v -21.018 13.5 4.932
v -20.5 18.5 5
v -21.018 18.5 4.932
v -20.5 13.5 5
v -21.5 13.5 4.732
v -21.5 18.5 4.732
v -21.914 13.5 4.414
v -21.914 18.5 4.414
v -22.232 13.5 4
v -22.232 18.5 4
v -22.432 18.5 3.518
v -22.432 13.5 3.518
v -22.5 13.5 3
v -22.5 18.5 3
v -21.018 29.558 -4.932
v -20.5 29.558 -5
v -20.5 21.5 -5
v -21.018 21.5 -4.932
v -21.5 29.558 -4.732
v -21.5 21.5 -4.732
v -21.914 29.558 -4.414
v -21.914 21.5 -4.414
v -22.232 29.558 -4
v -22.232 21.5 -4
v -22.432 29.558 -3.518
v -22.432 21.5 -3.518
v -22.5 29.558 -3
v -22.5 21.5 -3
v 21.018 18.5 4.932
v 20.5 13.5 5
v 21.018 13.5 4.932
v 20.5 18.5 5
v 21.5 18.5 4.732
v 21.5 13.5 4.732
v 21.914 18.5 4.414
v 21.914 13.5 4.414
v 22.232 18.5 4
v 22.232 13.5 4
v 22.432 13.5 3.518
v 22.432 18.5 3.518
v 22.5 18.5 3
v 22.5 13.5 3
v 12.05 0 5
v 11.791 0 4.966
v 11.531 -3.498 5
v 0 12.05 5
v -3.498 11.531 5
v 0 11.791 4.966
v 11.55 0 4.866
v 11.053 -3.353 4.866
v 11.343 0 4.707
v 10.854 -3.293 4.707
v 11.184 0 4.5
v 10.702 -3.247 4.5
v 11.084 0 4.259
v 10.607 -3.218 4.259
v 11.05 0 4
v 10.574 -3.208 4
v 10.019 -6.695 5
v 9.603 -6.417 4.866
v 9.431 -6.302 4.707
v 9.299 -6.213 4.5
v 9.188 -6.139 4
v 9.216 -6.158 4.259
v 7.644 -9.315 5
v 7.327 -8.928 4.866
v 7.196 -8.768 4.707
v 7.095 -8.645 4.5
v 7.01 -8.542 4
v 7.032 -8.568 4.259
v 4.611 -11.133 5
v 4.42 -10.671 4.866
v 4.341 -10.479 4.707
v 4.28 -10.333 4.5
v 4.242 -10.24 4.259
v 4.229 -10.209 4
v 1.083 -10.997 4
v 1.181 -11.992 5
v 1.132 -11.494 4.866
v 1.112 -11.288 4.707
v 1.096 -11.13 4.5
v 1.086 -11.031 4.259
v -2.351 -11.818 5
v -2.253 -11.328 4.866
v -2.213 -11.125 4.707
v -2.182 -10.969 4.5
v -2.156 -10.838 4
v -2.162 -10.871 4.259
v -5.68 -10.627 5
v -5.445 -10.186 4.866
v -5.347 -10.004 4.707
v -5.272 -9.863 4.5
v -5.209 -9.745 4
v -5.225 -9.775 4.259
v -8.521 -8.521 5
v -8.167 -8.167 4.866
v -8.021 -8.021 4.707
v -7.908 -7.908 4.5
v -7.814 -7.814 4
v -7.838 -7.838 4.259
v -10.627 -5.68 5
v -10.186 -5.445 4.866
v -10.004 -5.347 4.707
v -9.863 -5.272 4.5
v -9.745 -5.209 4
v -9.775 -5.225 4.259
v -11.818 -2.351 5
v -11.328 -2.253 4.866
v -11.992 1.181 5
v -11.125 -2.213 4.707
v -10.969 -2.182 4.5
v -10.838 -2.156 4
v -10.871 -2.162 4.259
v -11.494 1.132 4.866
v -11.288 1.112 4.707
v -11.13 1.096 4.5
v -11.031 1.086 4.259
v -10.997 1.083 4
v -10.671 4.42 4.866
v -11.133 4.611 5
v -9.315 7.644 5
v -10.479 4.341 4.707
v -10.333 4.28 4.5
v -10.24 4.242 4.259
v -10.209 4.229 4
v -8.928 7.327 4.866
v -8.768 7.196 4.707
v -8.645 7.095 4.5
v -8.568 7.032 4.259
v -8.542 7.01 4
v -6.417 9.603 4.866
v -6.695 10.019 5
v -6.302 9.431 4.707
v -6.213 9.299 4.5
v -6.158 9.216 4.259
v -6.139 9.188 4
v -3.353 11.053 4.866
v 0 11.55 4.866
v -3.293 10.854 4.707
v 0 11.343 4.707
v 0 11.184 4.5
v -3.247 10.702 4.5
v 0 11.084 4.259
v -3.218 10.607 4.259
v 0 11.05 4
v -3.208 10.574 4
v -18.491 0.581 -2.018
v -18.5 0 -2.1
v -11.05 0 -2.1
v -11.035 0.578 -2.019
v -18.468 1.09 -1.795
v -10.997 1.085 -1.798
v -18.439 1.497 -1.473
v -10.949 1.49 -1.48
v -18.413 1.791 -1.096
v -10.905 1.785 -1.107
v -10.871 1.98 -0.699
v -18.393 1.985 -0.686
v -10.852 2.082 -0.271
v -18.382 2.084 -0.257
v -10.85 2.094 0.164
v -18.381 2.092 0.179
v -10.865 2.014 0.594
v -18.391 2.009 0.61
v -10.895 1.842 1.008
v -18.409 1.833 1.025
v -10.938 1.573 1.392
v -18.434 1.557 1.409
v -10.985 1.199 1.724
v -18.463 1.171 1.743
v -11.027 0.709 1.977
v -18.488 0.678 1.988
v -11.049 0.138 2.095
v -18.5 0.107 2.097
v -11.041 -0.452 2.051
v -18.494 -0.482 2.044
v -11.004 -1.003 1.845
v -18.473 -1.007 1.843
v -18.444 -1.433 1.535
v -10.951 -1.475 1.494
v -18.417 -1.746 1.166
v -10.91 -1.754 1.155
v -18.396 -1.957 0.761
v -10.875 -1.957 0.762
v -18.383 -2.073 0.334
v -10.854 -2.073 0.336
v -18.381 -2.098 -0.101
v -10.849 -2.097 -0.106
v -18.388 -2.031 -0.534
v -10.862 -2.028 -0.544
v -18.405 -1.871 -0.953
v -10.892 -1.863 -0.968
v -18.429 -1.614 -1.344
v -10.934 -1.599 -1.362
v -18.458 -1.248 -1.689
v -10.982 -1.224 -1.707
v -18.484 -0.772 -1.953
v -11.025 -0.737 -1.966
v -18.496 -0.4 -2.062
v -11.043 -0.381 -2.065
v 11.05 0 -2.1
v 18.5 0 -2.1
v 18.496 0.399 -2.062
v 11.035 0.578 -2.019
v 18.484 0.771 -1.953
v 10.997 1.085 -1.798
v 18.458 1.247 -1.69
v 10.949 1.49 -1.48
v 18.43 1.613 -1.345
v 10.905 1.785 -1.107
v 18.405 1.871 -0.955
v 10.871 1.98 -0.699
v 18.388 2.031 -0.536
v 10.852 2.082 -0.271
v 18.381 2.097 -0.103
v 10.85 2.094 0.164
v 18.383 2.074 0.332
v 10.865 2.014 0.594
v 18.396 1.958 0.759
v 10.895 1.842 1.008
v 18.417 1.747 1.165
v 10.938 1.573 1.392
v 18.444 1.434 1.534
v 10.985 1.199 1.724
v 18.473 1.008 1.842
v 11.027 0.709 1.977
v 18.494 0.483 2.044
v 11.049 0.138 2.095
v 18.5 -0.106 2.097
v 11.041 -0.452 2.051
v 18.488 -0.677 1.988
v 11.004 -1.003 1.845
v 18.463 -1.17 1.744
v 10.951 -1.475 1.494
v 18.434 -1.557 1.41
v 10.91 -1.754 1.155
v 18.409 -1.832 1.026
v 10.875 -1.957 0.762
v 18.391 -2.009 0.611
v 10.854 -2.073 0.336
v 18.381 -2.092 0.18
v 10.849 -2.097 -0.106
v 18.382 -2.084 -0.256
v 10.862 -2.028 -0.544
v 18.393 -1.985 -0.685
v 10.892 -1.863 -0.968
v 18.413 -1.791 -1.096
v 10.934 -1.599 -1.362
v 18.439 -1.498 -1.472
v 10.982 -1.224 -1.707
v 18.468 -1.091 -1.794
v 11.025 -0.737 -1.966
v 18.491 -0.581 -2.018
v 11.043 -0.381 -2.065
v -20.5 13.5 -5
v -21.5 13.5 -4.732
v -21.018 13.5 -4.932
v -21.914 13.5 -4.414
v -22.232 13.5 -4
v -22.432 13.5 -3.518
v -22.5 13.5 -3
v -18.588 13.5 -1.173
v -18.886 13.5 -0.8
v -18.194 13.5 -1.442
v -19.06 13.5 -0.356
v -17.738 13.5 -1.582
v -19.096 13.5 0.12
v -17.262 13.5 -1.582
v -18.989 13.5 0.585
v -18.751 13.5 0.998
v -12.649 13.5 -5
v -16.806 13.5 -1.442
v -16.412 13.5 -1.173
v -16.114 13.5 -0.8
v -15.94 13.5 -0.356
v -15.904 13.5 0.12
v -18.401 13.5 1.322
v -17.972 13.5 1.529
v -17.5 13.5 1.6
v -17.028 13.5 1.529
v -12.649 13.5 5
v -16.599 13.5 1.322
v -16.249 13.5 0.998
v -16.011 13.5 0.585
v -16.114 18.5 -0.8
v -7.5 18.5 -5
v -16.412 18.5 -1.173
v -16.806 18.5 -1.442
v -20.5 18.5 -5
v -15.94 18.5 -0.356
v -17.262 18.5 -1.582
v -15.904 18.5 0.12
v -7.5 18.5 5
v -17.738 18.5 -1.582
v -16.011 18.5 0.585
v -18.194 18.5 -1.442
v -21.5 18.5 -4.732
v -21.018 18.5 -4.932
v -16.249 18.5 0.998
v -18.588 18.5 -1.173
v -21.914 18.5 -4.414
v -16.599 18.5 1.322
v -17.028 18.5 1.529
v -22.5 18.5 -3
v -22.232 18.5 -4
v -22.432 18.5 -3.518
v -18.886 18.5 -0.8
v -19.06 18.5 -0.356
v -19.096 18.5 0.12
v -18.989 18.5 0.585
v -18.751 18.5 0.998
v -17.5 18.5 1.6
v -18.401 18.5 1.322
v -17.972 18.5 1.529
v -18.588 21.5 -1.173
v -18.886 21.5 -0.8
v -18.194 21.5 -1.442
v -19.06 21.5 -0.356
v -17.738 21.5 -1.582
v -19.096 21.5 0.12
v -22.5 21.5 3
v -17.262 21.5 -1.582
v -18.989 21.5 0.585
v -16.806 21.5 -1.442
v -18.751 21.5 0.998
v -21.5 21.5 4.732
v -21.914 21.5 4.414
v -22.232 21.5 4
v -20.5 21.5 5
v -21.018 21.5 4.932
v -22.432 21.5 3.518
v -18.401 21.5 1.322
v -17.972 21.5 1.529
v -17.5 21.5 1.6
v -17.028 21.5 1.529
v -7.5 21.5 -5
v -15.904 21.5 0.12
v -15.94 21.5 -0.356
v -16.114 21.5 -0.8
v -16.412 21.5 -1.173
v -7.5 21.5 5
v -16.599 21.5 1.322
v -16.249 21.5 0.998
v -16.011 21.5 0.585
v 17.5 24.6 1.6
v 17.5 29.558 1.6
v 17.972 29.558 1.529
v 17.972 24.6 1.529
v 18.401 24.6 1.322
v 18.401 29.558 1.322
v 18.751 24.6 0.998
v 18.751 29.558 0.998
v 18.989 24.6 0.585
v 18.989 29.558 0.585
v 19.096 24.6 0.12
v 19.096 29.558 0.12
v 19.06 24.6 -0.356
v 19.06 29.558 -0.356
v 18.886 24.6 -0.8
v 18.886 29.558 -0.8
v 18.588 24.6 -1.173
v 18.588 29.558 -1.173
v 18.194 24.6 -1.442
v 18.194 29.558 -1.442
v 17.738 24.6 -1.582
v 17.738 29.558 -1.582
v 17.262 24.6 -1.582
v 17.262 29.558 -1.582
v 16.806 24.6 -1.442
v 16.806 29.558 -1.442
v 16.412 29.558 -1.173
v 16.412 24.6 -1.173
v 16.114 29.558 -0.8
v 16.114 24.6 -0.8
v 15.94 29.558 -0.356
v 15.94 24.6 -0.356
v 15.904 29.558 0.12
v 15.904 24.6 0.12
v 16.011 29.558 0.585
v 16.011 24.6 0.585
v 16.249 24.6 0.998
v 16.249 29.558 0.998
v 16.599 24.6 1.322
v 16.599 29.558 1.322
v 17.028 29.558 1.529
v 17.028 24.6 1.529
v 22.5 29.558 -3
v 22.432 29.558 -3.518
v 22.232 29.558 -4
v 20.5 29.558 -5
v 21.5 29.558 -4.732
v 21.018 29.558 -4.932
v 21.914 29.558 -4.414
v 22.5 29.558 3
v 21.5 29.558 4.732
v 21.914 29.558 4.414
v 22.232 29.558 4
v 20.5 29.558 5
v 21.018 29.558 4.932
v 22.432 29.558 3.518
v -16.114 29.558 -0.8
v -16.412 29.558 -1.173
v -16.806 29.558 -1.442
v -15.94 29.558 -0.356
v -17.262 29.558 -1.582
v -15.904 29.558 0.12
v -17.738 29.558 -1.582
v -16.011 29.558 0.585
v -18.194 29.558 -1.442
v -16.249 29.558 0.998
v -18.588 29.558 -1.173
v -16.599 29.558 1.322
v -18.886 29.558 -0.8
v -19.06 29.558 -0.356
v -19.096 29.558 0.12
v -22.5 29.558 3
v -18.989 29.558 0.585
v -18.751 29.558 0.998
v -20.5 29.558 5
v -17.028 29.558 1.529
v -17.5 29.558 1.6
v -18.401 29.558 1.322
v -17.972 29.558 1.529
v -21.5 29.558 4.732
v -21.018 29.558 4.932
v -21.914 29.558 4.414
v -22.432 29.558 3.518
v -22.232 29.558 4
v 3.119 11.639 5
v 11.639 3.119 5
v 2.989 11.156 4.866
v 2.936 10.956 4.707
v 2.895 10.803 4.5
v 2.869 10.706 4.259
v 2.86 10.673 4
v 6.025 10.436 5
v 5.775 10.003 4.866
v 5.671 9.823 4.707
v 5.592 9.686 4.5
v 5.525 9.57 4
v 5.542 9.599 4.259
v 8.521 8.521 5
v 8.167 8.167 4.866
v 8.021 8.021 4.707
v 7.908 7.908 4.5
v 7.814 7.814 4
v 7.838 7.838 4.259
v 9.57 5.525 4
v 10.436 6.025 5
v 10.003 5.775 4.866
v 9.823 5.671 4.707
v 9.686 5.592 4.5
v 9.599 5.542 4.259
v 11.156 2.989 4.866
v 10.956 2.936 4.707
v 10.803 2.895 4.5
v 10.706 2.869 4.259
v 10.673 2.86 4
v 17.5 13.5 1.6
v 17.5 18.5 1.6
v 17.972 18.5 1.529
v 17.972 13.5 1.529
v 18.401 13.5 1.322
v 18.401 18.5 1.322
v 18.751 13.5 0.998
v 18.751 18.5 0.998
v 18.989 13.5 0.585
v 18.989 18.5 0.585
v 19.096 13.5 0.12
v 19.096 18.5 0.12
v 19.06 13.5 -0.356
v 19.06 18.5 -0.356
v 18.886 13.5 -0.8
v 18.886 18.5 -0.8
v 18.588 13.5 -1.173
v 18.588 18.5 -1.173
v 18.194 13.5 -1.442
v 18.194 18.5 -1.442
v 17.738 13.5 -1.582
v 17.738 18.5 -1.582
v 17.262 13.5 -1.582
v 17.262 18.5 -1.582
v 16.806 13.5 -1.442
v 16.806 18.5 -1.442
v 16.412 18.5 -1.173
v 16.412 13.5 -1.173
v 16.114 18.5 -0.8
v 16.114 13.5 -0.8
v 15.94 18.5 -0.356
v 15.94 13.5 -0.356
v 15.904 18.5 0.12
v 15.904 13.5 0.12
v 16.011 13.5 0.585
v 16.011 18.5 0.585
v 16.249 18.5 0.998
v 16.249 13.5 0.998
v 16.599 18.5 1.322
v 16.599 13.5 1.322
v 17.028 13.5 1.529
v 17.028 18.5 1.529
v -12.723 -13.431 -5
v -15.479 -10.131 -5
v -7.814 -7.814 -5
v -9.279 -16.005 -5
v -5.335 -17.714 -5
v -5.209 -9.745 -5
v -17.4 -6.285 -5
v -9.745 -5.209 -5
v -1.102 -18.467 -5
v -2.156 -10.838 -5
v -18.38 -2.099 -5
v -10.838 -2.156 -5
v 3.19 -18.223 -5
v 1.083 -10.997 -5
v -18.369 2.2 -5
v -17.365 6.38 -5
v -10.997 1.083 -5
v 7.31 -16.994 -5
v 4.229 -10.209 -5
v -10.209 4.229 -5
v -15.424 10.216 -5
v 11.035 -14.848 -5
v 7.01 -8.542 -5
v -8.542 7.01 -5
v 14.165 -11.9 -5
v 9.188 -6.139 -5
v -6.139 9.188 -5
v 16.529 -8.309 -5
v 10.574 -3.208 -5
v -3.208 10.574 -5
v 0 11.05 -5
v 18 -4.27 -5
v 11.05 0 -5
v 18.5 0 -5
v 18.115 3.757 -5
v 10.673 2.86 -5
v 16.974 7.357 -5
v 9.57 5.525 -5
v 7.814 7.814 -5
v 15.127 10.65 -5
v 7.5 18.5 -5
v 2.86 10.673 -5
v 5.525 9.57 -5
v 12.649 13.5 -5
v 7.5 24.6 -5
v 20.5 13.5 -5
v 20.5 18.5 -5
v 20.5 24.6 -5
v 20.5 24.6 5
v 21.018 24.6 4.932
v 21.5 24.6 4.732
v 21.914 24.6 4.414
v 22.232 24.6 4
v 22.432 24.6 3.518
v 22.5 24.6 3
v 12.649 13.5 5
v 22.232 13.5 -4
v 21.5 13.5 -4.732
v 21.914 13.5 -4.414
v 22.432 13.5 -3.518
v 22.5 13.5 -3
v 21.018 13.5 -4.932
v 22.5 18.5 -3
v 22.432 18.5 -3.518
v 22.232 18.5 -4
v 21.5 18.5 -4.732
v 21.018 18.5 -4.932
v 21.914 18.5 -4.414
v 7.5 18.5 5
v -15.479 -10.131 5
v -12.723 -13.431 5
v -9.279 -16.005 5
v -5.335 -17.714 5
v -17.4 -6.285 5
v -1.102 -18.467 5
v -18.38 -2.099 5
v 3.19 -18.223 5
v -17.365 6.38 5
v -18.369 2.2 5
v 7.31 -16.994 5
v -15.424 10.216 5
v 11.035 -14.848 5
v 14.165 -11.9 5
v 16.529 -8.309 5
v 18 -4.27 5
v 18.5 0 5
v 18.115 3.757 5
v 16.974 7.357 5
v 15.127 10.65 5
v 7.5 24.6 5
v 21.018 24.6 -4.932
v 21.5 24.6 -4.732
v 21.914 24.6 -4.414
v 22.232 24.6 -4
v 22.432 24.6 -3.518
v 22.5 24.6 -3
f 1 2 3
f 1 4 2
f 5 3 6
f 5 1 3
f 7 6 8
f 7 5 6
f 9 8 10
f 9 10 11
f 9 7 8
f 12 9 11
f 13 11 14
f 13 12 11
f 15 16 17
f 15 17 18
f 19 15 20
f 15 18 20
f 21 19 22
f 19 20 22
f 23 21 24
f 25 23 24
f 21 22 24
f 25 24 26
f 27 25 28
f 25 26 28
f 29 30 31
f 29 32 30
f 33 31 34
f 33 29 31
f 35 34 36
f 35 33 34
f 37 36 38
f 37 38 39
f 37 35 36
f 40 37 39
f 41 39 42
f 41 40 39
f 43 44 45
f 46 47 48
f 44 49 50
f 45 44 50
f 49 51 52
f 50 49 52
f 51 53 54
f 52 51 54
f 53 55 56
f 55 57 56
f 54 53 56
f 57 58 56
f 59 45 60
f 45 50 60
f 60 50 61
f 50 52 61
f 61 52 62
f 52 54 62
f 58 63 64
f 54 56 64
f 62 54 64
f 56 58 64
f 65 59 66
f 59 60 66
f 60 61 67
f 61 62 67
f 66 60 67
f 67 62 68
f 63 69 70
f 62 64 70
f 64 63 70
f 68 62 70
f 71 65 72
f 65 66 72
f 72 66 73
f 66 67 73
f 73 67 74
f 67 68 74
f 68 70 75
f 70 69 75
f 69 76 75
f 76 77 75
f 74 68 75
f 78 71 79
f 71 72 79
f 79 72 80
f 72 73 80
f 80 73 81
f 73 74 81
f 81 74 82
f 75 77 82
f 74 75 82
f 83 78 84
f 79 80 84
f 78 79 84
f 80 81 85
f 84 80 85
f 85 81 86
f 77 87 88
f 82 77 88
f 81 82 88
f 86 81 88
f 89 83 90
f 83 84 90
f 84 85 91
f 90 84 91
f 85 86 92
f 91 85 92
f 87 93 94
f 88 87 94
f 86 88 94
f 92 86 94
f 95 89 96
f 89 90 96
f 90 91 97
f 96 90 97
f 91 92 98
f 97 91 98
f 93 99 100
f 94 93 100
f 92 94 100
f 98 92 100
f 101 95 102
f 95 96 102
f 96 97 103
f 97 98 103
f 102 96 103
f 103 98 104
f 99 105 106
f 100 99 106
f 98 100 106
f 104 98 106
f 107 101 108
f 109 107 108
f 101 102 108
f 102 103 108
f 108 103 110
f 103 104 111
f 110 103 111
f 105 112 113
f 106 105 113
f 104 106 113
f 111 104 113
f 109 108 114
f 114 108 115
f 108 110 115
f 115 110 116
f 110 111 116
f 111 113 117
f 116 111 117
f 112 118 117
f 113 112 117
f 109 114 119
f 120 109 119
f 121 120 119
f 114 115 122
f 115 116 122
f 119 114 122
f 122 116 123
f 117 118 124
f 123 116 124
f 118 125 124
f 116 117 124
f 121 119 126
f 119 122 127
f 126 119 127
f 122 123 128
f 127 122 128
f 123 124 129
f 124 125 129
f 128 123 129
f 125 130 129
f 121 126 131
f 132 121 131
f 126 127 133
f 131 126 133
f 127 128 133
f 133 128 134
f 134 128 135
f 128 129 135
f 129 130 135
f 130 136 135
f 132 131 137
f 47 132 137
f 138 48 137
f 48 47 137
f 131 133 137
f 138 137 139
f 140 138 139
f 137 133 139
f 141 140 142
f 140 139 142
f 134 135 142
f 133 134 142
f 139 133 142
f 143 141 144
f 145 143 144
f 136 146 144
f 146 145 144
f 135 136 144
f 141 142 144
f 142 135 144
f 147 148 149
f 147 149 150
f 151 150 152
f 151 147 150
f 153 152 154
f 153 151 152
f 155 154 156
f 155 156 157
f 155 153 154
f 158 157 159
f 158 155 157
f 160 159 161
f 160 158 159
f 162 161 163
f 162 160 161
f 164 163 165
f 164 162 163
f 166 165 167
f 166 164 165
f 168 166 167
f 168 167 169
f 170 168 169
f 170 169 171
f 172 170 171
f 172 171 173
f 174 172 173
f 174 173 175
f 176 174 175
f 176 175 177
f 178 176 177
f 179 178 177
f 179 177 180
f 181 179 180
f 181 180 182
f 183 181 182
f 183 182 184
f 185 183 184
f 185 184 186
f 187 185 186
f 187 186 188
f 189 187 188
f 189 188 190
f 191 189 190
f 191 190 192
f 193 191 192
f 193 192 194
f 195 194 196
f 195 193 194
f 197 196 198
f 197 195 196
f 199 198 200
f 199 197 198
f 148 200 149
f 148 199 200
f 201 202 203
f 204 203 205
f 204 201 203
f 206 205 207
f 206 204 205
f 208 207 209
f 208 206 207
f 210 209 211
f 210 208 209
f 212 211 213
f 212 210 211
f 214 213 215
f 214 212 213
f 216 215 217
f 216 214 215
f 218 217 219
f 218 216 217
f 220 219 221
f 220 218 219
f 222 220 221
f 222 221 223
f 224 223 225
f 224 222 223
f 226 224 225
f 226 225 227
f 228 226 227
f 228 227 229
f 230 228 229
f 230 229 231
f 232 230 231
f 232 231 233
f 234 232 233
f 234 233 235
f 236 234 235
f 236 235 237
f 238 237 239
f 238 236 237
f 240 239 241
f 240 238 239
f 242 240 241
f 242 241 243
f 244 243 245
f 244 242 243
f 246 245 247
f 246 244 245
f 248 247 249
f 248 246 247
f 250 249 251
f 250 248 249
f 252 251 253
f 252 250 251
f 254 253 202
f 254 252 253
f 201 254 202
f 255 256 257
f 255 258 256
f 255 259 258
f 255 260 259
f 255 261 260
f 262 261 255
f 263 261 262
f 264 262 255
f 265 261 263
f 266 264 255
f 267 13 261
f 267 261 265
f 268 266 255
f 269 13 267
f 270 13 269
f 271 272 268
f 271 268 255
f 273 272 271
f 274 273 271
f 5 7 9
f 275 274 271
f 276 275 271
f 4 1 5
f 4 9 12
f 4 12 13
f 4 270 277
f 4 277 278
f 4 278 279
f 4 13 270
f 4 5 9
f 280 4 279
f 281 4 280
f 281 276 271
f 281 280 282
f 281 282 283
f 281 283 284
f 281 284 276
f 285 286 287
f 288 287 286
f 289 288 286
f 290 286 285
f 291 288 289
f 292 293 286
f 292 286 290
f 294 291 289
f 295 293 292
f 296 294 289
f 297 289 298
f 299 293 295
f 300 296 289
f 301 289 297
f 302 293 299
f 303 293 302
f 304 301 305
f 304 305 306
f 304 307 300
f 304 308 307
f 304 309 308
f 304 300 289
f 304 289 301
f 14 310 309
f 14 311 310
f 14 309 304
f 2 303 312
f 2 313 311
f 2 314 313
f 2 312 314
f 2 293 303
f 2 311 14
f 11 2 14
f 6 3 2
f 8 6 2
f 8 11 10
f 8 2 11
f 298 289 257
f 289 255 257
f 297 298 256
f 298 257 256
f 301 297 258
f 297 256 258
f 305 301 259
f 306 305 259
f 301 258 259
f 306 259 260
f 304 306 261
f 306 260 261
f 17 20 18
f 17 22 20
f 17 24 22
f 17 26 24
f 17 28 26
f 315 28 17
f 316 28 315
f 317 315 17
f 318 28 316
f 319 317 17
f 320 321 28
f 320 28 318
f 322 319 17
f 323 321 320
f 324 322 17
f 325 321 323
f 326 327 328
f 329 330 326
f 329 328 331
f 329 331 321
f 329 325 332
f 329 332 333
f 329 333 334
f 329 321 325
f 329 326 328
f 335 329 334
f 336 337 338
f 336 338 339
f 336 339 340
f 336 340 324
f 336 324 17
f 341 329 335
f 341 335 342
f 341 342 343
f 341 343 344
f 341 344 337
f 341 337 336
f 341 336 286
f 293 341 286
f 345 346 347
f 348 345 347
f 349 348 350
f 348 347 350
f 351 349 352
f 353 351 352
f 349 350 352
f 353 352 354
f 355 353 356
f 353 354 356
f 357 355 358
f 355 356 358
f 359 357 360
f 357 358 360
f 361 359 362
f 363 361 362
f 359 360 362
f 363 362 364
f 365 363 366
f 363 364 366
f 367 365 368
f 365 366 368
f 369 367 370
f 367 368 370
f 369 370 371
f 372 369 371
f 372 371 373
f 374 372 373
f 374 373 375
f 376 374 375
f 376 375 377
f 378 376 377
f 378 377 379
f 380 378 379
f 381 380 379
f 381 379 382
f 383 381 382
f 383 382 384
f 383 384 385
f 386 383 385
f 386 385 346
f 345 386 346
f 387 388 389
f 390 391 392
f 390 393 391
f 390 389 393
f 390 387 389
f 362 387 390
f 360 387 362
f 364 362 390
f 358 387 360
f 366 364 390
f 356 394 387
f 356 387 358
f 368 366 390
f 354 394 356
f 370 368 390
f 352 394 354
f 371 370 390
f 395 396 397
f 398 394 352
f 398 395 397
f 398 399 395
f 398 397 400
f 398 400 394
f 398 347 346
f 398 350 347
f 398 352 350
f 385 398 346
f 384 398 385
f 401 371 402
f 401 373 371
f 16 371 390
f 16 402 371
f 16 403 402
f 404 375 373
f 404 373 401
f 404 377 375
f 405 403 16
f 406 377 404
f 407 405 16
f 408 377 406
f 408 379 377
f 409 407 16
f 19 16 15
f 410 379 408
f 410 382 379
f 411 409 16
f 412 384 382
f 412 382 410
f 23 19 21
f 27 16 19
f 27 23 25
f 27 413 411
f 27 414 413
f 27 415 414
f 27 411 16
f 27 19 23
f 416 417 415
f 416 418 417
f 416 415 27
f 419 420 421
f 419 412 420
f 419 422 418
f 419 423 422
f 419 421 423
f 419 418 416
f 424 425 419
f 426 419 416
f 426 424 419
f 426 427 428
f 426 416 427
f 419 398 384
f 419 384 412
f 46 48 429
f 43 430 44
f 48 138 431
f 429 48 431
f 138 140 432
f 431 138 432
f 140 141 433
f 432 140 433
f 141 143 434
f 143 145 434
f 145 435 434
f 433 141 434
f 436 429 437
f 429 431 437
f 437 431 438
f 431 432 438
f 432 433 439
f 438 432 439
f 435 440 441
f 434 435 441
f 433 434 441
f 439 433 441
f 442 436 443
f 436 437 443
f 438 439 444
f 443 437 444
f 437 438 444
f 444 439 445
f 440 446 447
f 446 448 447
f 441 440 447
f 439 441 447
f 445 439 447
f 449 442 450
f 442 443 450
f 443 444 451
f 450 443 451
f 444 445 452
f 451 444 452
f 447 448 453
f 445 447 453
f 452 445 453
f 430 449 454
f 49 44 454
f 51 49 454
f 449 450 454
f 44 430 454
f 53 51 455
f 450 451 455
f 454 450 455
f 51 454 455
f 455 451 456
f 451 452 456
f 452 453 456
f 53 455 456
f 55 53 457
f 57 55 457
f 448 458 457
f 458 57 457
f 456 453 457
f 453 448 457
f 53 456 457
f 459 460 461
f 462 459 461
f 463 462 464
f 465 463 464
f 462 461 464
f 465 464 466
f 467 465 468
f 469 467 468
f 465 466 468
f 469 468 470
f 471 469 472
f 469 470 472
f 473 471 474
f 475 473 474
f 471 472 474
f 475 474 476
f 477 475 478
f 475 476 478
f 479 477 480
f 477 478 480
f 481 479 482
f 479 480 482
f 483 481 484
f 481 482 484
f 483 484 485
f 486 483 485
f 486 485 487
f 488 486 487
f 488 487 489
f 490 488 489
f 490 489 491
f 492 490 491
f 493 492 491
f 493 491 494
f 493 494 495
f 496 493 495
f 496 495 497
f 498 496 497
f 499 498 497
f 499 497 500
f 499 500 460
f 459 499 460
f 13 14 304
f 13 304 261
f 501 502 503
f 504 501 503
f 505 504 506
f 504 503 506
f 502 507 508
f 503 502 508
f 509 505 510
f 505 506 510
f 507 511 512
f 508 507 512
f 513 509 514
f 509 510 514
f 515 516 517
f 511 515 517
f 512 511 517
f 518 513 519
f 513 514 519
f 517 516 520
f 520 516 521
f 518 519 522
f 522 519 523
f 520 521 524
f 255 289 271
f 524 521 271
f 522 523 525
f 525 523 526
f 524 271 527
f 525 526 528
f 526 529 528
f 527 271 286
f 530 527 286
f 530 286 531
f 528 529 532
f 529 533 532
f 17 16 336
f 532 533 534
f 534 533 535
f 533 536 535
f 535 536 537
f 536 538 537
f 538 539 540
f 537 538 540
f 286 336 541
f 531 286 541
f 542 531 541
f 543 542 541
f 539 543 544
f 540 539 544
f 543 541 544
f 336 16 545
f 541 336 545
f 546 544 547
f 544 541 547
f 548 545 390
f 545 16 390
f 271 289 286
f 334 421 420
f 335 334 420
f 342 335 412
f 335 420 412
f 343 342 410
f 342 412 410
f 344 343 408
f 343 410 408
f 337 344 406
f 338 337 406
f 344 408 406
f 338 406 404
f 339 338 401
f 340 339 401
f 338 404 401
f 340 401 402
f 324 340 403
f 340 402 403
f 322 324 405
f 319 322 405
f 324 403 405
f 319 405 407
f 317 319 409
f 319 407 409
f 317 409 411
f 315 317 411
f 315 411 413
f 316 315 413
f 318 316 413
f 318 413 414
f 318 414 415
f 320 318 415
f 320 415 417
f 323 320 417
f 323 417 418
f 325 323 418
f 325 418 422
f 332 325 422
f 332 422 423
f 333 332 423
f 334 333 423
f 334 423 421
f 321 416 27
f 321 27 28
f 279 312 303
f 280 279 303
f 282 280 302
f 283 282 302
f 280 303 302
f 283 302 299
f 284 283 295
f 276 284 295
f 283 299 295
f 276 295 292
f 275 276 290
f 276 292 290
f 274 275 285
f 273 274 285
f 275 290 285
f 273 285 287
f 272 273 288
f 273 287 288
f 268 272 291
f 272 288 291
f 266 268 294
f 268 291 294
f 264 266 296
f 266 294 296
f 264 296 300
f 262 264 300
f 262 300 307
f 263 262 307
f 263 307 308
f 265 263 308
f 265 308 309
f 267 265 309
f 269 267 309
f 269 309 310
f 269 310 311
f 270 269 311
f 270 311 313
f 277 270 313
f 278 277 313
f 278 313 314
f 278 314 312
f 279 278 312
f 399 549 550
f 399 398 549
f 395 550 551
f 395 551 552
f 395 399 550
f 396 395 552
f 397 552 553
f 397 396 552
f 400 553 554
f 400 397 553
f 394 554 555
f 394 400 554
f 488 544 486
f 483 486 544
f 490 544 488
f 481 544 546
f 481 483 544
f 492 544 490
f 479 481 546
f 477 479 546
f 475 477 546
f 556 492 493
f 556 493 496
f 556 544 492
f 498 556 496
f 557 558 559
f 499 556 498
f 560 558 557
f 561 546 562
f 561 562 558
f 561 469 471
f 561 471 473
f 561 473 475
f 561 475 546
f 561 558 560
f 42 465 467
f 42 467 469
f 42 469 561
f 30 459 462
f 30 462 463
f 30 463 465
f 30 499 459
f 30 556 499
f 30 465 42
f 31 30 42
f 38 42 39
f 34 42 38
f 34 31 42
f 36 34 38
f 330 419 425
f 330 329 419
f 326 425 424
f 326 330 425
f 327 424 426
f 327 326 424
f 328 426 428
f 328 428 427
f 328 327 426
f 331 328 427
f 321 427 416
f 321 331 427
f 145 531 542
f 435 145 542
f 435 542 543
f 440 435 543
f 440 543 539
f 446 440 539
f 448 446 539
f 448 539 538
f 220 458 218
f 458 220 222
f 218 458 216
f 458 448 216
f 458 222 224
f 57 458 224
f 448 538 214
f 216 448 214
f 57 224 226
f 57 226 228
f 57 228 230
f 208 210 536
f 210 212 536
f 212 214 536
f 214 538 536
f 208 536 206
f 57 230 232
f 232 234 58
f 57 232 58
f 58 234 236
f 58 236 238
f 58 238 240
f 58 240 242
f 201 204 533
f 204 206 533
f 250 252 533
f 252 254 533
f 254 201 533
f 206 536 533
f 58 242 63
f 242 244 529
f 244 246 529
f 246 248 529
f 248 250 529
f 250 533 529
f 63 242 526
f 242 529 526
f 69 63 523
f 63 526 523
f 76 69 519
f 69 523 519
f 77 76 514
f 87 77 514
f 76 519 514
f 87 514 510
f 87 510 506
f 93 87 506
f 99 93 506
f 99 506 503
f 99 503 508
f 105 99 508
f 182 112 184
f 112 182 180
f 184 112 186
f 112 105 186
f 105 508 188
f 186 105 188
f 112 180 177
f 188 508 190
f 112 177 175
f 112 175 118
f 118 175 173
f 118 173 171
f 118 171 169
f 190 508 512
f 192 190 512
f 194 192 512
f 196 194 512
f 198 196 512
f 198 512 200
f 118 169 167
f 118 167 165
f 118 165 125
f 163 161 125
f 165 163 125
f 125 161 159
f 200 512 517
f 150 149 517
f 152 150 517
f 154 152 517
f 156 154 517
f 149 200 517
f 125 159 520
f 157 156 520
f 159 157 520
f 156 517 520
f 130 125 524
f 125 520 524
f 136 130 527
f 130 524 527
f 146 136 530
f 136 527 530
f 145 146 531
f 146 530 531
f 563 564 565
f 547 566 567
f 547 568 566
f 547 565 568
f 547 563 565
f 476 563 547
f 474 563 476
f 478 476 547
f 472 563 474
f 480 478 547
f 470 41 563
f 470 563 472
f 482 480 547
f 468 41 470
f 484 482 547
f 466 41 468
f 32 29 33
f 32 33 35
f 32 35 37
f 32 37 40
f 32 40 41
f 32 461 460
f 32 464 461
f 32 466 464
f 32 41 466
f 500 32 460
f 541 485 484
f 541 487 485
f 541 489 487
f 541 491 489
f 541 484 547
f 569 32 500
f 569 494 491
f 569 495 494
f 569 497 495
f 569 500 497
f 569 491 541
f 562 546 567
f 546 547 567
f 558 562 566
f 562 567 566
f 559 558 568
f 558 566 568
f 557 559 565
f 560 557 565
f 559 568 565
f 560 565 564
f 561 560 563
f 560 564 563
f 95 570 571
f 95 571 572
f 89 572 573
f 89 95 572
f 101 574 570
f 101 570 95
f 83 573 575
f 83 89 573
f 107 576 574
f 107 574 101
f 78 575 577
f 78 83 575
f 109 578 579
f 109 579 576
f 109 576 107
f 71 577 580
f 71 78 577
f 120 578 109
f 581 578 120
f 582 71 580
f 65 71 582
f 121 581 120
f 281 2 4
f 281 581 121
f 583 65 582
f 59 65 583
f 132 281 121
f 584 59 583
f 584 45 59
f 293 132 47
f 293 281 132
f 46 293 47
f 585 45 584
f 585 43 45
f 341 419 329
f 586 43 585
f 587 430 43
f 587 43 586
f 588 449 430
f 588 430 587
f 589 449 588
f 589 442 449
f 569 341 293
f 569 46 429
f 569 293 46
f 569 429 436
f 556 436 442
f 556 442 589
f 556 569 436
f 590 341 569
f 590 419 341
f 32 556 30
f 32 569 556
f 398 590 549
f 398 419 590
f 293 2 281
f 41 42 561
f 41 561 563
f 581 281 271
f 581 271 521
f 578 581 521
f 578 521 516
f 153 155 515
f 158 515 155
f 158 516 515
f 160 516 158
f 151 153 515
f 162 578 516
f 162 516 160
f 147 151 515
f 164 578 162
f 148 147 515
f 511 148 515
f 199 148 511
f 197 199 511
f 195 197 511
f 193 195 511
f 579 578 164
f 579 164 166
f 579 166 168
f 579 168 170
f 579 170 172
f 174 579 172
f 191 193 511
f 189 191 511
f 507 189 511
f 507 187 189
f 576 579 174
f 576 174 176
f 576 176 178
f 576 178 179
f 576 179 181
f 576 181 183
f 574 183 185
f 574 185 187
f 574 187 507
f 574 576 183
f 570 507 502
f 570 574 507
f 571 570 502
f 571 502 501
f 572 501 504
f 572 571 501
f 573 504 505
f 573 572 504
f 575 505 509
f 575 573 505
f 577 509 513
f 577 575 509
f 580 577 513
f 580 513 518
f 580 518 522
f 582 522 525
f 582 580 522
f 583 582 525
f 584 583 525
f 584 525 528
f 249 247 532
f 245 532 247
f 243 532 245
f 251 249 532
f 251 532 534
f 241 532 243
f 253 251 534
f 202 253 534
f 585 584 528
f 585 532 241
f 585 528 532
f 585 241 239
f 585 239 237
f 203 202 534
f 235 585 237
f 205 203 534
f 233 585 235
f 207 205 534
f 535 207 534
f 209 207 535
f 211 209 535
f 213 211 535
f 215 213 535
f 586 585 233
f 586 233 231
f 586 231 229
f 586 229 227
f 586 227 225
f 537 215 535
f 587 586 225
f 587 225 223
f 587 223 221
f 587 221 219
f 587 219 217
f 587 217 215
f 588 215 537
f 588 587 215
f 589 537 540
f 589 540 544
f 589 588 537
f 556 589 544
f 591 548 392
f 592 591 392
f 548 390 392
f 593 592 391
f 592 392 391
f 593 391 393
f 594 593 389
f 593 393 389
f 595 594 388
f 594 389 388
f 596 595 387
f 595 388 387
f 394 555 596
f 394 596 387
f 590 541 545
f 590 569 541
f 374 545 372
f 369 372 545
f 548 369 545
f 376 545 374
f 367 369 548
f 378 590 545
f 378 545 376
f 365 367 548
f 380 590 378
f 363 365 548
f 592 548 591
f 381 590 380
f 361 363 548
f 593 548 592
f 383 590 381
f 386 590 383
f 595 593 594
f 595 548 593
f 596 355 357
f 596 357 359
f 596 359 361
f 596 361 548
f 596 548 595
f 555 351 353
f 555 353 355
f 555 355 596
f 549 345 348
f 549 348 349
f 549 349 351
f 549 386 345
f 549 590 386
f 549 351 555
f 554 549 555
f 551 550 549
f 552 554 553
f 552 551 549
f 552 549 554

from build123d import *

# Parameters (mm, degrees)
CROQUIS1_W                 = 7.5
CROQUIS1_H                 = 6.1
SALIENTE_EXTRUIR2_DEPTH    = 5
CROQUIS2_R                 = 1.6
CORTAR_EXTRUIR1_DEPTH      = 18
REDONDEO1_R                = 1
CORTAR_EXTRUIR2_DEPTH      = 38.482562804
CORTAR_EXTRUIR2_DEPTH_BACK = 38.482562804
CROQUIS3_R                 = 2.1
REDONDEO2_R                = 2


with BuildPart() as part:
    # Croquis1 → Saliente-Extruir2 (new, symmetric)
    # profile 1 of 8: a face of its own
    with BuildSketch(Plane.XY):
        with BuildLine():
            ThreePointArc((12.649110641, 13.5), (6.800735254, 17.204650534), (-1e-09, 18.5))
            ThreePointArc((-1e-09, 18.5), (-6.800735255, 17.204650534), (-12.649110641, 13.5))
            ThreePointArc((-12.649110641, 13.5), (-7.356679045, -16.974371076), (18.5, 0))
            ThreePointArc((18.5, 0), (16.974371076, 7.356679045), (12.649110641, 13.5))
        make_face()
        with BuildLine():
            ThreePointArc((11.05, 0), (-7.813529932, -7.813529932), (0, 11.05))
            ThreePointArc((0, 11.05), (7.813529932, 7.813529932), (11.05, 0))
        make_face(mode=Mode.SUBTRACT)
    # profile 2 of 8: a face of its own
    with BuildSketch(Plane.XY):
        with BuildLine():
            ThreePointArc((12.649110641, 13.5), (6.800735254, 17.204650534), (-1e-09, 18.5))
            ThreePointArc((-1e-09, 18.5), (-6.800735255, 17.204650534), (-12.649110641, 13.5))
            ThreePointArc((-12.649110641, 13.5), (-7.356679045, -16.974371076), (18.5, 0))
            ThreePointArc((18.5, 0), (16.974371076, 7.356679045), (12.649110641, 13.5))
        make_face()
        with BuildLine():
            ThreePointArc((11.05, 0), (-7.813529932, -7.813529932), (0, 11.05))
            ThreePointArc((0, 11.05), (7.813529932, 7.813529932), (11.05, 0))
        make_face(mode=Mode.SUBTRACT)
    # profile 3 of 8: a face of its own
    with BuildSketch(Plane.XY):
        with BuildLine():
            Line((7.5, 18.5), (-1e-09, 18.5))
            ThreePointArc((-1e-09, 18.5), (6.800735254, 17.204650534), (12.649110641, 13.5))
            Line((12.649110641, 13.5), (22.5, 13.5))
            Line((22.5, 13.5), (22.5, 18.5))
            Line((22.5, 18.5), (7.5, 18.5))
        make_face()
    # profile 4 of 8: a face of its own
    with BuildSketch(Plane.XY):
        with BuildLine():
            Line((-7.5, 18.5), (-22.5, 18.5))
            Line((-22.5, 18.5), (-22.5, 13.5))
            Line((-22.5, 13.5), (-12.649110641, 13.5))
            ThreePointArc((-12.649110641, 13.5), (-6.800735255, 17.204650534), (-1e-09, 18.5))
            Line((-1e-09, 18.5), (-7.5, 18.5))
        make_face()
    # profile 5 of 8: a face of its own
    with BuildSketch(Plane.XY):
        Polygon((-22.5, 21.5), (-7.5, 21.5), (-7.5, 24.6), (0, 24.6), (0, 29.558290112), (-22.5, 29.558290112), (-22.5, 24.558290112), align=None)
    # profile 6 of 8: a face of its own
    with BuildSketch(Plane.XY):
        with Locations((3.75, 21.55)):
            Rectangle(CROQUIS1_W, CROQUIS1_H)
    # profile 7 of 8: a face of its own
    with BuildSketch(Plane.XY):
        Polygon((-7.5, 21.5), (-7.5, 18.5), (-1e-09, 18.5), (0, 24.6), (-7.5, 24.6), align=None)
    # profile 8 of 8: a face of its own
    with BuildSketch(Plane.XY):
        Polygon((0, 29.558290112), (0, 24.6), (7.5, 24.6), (22.5, 24.6), (22.5, 29.558290112), align=None)
    extrude(amount=SALIENTE_EXTRUIR2_DEPTH, both=True)

    # Croquis2 → Cortar-Extruir1 (cut)
    with BuildSketch(Plane(origin=(0, 29.558290112, 0), x_dir=(1, 0, 0), z_dir=(0, 1, 0))):
        with Locations(Location((-17.5, 0, 0), (0, 0, 270))):
            Circle(CROQUIS2_R)
        with Locations(Location((17.5, 0, 0), (0, 0, 270))):
            Circle(CROQUIS2_R)
    extrude(amount=-CORTAR_EXTRUIR1_DEPTH, mode=Mode.SUBTRACT)

    # Redondeo1
    redondeo1_edges = [part.edges().sort_by_distance(p)[0] for p in [
        (7.813529932, 7.813529932, 5),
    ]]
    fillet(redondeo1_edges, radius=REDONDEO1_R)

    # Croquis3 → Cortar-Extruir2 (cut, two sides: drawn at the far end of the back side and taken through both)
    with BuildSketch(Plane(origin=(0, 0, 0), x_dir=(0, 0, -1), z_dir=(1, 0, 0)).offset(-CORTAR_EXTRUIR2_DEPTH_BACK)):
        Circle(CROQUIS3_R)
    extrude(amount=CORTAR_EXTRUIR2_DEPTH + CORTAR_EXTRUIR2_DEPTH_BACK, mode=Mode.SUBTRACT)

    # Redondeo2
    redondeo2_edges = [part.edges().sort_by_distance(p)[0] for p in [
        (22.5, 16, -5),
        (-22.5, 16, -5),
        (-22.5, 25.529145056, -5),
        (22.5, 27.079145056, 5),
        (22.5, 27.079145056, -5),
        (-22.5, 25.529145056, 5),
        (-22.5, 16, 5),
        (22.5, 16, 5),
    ]]
    fillet(redondeo2_edges, radius=REDONDEO2_R)


solid = part.part
